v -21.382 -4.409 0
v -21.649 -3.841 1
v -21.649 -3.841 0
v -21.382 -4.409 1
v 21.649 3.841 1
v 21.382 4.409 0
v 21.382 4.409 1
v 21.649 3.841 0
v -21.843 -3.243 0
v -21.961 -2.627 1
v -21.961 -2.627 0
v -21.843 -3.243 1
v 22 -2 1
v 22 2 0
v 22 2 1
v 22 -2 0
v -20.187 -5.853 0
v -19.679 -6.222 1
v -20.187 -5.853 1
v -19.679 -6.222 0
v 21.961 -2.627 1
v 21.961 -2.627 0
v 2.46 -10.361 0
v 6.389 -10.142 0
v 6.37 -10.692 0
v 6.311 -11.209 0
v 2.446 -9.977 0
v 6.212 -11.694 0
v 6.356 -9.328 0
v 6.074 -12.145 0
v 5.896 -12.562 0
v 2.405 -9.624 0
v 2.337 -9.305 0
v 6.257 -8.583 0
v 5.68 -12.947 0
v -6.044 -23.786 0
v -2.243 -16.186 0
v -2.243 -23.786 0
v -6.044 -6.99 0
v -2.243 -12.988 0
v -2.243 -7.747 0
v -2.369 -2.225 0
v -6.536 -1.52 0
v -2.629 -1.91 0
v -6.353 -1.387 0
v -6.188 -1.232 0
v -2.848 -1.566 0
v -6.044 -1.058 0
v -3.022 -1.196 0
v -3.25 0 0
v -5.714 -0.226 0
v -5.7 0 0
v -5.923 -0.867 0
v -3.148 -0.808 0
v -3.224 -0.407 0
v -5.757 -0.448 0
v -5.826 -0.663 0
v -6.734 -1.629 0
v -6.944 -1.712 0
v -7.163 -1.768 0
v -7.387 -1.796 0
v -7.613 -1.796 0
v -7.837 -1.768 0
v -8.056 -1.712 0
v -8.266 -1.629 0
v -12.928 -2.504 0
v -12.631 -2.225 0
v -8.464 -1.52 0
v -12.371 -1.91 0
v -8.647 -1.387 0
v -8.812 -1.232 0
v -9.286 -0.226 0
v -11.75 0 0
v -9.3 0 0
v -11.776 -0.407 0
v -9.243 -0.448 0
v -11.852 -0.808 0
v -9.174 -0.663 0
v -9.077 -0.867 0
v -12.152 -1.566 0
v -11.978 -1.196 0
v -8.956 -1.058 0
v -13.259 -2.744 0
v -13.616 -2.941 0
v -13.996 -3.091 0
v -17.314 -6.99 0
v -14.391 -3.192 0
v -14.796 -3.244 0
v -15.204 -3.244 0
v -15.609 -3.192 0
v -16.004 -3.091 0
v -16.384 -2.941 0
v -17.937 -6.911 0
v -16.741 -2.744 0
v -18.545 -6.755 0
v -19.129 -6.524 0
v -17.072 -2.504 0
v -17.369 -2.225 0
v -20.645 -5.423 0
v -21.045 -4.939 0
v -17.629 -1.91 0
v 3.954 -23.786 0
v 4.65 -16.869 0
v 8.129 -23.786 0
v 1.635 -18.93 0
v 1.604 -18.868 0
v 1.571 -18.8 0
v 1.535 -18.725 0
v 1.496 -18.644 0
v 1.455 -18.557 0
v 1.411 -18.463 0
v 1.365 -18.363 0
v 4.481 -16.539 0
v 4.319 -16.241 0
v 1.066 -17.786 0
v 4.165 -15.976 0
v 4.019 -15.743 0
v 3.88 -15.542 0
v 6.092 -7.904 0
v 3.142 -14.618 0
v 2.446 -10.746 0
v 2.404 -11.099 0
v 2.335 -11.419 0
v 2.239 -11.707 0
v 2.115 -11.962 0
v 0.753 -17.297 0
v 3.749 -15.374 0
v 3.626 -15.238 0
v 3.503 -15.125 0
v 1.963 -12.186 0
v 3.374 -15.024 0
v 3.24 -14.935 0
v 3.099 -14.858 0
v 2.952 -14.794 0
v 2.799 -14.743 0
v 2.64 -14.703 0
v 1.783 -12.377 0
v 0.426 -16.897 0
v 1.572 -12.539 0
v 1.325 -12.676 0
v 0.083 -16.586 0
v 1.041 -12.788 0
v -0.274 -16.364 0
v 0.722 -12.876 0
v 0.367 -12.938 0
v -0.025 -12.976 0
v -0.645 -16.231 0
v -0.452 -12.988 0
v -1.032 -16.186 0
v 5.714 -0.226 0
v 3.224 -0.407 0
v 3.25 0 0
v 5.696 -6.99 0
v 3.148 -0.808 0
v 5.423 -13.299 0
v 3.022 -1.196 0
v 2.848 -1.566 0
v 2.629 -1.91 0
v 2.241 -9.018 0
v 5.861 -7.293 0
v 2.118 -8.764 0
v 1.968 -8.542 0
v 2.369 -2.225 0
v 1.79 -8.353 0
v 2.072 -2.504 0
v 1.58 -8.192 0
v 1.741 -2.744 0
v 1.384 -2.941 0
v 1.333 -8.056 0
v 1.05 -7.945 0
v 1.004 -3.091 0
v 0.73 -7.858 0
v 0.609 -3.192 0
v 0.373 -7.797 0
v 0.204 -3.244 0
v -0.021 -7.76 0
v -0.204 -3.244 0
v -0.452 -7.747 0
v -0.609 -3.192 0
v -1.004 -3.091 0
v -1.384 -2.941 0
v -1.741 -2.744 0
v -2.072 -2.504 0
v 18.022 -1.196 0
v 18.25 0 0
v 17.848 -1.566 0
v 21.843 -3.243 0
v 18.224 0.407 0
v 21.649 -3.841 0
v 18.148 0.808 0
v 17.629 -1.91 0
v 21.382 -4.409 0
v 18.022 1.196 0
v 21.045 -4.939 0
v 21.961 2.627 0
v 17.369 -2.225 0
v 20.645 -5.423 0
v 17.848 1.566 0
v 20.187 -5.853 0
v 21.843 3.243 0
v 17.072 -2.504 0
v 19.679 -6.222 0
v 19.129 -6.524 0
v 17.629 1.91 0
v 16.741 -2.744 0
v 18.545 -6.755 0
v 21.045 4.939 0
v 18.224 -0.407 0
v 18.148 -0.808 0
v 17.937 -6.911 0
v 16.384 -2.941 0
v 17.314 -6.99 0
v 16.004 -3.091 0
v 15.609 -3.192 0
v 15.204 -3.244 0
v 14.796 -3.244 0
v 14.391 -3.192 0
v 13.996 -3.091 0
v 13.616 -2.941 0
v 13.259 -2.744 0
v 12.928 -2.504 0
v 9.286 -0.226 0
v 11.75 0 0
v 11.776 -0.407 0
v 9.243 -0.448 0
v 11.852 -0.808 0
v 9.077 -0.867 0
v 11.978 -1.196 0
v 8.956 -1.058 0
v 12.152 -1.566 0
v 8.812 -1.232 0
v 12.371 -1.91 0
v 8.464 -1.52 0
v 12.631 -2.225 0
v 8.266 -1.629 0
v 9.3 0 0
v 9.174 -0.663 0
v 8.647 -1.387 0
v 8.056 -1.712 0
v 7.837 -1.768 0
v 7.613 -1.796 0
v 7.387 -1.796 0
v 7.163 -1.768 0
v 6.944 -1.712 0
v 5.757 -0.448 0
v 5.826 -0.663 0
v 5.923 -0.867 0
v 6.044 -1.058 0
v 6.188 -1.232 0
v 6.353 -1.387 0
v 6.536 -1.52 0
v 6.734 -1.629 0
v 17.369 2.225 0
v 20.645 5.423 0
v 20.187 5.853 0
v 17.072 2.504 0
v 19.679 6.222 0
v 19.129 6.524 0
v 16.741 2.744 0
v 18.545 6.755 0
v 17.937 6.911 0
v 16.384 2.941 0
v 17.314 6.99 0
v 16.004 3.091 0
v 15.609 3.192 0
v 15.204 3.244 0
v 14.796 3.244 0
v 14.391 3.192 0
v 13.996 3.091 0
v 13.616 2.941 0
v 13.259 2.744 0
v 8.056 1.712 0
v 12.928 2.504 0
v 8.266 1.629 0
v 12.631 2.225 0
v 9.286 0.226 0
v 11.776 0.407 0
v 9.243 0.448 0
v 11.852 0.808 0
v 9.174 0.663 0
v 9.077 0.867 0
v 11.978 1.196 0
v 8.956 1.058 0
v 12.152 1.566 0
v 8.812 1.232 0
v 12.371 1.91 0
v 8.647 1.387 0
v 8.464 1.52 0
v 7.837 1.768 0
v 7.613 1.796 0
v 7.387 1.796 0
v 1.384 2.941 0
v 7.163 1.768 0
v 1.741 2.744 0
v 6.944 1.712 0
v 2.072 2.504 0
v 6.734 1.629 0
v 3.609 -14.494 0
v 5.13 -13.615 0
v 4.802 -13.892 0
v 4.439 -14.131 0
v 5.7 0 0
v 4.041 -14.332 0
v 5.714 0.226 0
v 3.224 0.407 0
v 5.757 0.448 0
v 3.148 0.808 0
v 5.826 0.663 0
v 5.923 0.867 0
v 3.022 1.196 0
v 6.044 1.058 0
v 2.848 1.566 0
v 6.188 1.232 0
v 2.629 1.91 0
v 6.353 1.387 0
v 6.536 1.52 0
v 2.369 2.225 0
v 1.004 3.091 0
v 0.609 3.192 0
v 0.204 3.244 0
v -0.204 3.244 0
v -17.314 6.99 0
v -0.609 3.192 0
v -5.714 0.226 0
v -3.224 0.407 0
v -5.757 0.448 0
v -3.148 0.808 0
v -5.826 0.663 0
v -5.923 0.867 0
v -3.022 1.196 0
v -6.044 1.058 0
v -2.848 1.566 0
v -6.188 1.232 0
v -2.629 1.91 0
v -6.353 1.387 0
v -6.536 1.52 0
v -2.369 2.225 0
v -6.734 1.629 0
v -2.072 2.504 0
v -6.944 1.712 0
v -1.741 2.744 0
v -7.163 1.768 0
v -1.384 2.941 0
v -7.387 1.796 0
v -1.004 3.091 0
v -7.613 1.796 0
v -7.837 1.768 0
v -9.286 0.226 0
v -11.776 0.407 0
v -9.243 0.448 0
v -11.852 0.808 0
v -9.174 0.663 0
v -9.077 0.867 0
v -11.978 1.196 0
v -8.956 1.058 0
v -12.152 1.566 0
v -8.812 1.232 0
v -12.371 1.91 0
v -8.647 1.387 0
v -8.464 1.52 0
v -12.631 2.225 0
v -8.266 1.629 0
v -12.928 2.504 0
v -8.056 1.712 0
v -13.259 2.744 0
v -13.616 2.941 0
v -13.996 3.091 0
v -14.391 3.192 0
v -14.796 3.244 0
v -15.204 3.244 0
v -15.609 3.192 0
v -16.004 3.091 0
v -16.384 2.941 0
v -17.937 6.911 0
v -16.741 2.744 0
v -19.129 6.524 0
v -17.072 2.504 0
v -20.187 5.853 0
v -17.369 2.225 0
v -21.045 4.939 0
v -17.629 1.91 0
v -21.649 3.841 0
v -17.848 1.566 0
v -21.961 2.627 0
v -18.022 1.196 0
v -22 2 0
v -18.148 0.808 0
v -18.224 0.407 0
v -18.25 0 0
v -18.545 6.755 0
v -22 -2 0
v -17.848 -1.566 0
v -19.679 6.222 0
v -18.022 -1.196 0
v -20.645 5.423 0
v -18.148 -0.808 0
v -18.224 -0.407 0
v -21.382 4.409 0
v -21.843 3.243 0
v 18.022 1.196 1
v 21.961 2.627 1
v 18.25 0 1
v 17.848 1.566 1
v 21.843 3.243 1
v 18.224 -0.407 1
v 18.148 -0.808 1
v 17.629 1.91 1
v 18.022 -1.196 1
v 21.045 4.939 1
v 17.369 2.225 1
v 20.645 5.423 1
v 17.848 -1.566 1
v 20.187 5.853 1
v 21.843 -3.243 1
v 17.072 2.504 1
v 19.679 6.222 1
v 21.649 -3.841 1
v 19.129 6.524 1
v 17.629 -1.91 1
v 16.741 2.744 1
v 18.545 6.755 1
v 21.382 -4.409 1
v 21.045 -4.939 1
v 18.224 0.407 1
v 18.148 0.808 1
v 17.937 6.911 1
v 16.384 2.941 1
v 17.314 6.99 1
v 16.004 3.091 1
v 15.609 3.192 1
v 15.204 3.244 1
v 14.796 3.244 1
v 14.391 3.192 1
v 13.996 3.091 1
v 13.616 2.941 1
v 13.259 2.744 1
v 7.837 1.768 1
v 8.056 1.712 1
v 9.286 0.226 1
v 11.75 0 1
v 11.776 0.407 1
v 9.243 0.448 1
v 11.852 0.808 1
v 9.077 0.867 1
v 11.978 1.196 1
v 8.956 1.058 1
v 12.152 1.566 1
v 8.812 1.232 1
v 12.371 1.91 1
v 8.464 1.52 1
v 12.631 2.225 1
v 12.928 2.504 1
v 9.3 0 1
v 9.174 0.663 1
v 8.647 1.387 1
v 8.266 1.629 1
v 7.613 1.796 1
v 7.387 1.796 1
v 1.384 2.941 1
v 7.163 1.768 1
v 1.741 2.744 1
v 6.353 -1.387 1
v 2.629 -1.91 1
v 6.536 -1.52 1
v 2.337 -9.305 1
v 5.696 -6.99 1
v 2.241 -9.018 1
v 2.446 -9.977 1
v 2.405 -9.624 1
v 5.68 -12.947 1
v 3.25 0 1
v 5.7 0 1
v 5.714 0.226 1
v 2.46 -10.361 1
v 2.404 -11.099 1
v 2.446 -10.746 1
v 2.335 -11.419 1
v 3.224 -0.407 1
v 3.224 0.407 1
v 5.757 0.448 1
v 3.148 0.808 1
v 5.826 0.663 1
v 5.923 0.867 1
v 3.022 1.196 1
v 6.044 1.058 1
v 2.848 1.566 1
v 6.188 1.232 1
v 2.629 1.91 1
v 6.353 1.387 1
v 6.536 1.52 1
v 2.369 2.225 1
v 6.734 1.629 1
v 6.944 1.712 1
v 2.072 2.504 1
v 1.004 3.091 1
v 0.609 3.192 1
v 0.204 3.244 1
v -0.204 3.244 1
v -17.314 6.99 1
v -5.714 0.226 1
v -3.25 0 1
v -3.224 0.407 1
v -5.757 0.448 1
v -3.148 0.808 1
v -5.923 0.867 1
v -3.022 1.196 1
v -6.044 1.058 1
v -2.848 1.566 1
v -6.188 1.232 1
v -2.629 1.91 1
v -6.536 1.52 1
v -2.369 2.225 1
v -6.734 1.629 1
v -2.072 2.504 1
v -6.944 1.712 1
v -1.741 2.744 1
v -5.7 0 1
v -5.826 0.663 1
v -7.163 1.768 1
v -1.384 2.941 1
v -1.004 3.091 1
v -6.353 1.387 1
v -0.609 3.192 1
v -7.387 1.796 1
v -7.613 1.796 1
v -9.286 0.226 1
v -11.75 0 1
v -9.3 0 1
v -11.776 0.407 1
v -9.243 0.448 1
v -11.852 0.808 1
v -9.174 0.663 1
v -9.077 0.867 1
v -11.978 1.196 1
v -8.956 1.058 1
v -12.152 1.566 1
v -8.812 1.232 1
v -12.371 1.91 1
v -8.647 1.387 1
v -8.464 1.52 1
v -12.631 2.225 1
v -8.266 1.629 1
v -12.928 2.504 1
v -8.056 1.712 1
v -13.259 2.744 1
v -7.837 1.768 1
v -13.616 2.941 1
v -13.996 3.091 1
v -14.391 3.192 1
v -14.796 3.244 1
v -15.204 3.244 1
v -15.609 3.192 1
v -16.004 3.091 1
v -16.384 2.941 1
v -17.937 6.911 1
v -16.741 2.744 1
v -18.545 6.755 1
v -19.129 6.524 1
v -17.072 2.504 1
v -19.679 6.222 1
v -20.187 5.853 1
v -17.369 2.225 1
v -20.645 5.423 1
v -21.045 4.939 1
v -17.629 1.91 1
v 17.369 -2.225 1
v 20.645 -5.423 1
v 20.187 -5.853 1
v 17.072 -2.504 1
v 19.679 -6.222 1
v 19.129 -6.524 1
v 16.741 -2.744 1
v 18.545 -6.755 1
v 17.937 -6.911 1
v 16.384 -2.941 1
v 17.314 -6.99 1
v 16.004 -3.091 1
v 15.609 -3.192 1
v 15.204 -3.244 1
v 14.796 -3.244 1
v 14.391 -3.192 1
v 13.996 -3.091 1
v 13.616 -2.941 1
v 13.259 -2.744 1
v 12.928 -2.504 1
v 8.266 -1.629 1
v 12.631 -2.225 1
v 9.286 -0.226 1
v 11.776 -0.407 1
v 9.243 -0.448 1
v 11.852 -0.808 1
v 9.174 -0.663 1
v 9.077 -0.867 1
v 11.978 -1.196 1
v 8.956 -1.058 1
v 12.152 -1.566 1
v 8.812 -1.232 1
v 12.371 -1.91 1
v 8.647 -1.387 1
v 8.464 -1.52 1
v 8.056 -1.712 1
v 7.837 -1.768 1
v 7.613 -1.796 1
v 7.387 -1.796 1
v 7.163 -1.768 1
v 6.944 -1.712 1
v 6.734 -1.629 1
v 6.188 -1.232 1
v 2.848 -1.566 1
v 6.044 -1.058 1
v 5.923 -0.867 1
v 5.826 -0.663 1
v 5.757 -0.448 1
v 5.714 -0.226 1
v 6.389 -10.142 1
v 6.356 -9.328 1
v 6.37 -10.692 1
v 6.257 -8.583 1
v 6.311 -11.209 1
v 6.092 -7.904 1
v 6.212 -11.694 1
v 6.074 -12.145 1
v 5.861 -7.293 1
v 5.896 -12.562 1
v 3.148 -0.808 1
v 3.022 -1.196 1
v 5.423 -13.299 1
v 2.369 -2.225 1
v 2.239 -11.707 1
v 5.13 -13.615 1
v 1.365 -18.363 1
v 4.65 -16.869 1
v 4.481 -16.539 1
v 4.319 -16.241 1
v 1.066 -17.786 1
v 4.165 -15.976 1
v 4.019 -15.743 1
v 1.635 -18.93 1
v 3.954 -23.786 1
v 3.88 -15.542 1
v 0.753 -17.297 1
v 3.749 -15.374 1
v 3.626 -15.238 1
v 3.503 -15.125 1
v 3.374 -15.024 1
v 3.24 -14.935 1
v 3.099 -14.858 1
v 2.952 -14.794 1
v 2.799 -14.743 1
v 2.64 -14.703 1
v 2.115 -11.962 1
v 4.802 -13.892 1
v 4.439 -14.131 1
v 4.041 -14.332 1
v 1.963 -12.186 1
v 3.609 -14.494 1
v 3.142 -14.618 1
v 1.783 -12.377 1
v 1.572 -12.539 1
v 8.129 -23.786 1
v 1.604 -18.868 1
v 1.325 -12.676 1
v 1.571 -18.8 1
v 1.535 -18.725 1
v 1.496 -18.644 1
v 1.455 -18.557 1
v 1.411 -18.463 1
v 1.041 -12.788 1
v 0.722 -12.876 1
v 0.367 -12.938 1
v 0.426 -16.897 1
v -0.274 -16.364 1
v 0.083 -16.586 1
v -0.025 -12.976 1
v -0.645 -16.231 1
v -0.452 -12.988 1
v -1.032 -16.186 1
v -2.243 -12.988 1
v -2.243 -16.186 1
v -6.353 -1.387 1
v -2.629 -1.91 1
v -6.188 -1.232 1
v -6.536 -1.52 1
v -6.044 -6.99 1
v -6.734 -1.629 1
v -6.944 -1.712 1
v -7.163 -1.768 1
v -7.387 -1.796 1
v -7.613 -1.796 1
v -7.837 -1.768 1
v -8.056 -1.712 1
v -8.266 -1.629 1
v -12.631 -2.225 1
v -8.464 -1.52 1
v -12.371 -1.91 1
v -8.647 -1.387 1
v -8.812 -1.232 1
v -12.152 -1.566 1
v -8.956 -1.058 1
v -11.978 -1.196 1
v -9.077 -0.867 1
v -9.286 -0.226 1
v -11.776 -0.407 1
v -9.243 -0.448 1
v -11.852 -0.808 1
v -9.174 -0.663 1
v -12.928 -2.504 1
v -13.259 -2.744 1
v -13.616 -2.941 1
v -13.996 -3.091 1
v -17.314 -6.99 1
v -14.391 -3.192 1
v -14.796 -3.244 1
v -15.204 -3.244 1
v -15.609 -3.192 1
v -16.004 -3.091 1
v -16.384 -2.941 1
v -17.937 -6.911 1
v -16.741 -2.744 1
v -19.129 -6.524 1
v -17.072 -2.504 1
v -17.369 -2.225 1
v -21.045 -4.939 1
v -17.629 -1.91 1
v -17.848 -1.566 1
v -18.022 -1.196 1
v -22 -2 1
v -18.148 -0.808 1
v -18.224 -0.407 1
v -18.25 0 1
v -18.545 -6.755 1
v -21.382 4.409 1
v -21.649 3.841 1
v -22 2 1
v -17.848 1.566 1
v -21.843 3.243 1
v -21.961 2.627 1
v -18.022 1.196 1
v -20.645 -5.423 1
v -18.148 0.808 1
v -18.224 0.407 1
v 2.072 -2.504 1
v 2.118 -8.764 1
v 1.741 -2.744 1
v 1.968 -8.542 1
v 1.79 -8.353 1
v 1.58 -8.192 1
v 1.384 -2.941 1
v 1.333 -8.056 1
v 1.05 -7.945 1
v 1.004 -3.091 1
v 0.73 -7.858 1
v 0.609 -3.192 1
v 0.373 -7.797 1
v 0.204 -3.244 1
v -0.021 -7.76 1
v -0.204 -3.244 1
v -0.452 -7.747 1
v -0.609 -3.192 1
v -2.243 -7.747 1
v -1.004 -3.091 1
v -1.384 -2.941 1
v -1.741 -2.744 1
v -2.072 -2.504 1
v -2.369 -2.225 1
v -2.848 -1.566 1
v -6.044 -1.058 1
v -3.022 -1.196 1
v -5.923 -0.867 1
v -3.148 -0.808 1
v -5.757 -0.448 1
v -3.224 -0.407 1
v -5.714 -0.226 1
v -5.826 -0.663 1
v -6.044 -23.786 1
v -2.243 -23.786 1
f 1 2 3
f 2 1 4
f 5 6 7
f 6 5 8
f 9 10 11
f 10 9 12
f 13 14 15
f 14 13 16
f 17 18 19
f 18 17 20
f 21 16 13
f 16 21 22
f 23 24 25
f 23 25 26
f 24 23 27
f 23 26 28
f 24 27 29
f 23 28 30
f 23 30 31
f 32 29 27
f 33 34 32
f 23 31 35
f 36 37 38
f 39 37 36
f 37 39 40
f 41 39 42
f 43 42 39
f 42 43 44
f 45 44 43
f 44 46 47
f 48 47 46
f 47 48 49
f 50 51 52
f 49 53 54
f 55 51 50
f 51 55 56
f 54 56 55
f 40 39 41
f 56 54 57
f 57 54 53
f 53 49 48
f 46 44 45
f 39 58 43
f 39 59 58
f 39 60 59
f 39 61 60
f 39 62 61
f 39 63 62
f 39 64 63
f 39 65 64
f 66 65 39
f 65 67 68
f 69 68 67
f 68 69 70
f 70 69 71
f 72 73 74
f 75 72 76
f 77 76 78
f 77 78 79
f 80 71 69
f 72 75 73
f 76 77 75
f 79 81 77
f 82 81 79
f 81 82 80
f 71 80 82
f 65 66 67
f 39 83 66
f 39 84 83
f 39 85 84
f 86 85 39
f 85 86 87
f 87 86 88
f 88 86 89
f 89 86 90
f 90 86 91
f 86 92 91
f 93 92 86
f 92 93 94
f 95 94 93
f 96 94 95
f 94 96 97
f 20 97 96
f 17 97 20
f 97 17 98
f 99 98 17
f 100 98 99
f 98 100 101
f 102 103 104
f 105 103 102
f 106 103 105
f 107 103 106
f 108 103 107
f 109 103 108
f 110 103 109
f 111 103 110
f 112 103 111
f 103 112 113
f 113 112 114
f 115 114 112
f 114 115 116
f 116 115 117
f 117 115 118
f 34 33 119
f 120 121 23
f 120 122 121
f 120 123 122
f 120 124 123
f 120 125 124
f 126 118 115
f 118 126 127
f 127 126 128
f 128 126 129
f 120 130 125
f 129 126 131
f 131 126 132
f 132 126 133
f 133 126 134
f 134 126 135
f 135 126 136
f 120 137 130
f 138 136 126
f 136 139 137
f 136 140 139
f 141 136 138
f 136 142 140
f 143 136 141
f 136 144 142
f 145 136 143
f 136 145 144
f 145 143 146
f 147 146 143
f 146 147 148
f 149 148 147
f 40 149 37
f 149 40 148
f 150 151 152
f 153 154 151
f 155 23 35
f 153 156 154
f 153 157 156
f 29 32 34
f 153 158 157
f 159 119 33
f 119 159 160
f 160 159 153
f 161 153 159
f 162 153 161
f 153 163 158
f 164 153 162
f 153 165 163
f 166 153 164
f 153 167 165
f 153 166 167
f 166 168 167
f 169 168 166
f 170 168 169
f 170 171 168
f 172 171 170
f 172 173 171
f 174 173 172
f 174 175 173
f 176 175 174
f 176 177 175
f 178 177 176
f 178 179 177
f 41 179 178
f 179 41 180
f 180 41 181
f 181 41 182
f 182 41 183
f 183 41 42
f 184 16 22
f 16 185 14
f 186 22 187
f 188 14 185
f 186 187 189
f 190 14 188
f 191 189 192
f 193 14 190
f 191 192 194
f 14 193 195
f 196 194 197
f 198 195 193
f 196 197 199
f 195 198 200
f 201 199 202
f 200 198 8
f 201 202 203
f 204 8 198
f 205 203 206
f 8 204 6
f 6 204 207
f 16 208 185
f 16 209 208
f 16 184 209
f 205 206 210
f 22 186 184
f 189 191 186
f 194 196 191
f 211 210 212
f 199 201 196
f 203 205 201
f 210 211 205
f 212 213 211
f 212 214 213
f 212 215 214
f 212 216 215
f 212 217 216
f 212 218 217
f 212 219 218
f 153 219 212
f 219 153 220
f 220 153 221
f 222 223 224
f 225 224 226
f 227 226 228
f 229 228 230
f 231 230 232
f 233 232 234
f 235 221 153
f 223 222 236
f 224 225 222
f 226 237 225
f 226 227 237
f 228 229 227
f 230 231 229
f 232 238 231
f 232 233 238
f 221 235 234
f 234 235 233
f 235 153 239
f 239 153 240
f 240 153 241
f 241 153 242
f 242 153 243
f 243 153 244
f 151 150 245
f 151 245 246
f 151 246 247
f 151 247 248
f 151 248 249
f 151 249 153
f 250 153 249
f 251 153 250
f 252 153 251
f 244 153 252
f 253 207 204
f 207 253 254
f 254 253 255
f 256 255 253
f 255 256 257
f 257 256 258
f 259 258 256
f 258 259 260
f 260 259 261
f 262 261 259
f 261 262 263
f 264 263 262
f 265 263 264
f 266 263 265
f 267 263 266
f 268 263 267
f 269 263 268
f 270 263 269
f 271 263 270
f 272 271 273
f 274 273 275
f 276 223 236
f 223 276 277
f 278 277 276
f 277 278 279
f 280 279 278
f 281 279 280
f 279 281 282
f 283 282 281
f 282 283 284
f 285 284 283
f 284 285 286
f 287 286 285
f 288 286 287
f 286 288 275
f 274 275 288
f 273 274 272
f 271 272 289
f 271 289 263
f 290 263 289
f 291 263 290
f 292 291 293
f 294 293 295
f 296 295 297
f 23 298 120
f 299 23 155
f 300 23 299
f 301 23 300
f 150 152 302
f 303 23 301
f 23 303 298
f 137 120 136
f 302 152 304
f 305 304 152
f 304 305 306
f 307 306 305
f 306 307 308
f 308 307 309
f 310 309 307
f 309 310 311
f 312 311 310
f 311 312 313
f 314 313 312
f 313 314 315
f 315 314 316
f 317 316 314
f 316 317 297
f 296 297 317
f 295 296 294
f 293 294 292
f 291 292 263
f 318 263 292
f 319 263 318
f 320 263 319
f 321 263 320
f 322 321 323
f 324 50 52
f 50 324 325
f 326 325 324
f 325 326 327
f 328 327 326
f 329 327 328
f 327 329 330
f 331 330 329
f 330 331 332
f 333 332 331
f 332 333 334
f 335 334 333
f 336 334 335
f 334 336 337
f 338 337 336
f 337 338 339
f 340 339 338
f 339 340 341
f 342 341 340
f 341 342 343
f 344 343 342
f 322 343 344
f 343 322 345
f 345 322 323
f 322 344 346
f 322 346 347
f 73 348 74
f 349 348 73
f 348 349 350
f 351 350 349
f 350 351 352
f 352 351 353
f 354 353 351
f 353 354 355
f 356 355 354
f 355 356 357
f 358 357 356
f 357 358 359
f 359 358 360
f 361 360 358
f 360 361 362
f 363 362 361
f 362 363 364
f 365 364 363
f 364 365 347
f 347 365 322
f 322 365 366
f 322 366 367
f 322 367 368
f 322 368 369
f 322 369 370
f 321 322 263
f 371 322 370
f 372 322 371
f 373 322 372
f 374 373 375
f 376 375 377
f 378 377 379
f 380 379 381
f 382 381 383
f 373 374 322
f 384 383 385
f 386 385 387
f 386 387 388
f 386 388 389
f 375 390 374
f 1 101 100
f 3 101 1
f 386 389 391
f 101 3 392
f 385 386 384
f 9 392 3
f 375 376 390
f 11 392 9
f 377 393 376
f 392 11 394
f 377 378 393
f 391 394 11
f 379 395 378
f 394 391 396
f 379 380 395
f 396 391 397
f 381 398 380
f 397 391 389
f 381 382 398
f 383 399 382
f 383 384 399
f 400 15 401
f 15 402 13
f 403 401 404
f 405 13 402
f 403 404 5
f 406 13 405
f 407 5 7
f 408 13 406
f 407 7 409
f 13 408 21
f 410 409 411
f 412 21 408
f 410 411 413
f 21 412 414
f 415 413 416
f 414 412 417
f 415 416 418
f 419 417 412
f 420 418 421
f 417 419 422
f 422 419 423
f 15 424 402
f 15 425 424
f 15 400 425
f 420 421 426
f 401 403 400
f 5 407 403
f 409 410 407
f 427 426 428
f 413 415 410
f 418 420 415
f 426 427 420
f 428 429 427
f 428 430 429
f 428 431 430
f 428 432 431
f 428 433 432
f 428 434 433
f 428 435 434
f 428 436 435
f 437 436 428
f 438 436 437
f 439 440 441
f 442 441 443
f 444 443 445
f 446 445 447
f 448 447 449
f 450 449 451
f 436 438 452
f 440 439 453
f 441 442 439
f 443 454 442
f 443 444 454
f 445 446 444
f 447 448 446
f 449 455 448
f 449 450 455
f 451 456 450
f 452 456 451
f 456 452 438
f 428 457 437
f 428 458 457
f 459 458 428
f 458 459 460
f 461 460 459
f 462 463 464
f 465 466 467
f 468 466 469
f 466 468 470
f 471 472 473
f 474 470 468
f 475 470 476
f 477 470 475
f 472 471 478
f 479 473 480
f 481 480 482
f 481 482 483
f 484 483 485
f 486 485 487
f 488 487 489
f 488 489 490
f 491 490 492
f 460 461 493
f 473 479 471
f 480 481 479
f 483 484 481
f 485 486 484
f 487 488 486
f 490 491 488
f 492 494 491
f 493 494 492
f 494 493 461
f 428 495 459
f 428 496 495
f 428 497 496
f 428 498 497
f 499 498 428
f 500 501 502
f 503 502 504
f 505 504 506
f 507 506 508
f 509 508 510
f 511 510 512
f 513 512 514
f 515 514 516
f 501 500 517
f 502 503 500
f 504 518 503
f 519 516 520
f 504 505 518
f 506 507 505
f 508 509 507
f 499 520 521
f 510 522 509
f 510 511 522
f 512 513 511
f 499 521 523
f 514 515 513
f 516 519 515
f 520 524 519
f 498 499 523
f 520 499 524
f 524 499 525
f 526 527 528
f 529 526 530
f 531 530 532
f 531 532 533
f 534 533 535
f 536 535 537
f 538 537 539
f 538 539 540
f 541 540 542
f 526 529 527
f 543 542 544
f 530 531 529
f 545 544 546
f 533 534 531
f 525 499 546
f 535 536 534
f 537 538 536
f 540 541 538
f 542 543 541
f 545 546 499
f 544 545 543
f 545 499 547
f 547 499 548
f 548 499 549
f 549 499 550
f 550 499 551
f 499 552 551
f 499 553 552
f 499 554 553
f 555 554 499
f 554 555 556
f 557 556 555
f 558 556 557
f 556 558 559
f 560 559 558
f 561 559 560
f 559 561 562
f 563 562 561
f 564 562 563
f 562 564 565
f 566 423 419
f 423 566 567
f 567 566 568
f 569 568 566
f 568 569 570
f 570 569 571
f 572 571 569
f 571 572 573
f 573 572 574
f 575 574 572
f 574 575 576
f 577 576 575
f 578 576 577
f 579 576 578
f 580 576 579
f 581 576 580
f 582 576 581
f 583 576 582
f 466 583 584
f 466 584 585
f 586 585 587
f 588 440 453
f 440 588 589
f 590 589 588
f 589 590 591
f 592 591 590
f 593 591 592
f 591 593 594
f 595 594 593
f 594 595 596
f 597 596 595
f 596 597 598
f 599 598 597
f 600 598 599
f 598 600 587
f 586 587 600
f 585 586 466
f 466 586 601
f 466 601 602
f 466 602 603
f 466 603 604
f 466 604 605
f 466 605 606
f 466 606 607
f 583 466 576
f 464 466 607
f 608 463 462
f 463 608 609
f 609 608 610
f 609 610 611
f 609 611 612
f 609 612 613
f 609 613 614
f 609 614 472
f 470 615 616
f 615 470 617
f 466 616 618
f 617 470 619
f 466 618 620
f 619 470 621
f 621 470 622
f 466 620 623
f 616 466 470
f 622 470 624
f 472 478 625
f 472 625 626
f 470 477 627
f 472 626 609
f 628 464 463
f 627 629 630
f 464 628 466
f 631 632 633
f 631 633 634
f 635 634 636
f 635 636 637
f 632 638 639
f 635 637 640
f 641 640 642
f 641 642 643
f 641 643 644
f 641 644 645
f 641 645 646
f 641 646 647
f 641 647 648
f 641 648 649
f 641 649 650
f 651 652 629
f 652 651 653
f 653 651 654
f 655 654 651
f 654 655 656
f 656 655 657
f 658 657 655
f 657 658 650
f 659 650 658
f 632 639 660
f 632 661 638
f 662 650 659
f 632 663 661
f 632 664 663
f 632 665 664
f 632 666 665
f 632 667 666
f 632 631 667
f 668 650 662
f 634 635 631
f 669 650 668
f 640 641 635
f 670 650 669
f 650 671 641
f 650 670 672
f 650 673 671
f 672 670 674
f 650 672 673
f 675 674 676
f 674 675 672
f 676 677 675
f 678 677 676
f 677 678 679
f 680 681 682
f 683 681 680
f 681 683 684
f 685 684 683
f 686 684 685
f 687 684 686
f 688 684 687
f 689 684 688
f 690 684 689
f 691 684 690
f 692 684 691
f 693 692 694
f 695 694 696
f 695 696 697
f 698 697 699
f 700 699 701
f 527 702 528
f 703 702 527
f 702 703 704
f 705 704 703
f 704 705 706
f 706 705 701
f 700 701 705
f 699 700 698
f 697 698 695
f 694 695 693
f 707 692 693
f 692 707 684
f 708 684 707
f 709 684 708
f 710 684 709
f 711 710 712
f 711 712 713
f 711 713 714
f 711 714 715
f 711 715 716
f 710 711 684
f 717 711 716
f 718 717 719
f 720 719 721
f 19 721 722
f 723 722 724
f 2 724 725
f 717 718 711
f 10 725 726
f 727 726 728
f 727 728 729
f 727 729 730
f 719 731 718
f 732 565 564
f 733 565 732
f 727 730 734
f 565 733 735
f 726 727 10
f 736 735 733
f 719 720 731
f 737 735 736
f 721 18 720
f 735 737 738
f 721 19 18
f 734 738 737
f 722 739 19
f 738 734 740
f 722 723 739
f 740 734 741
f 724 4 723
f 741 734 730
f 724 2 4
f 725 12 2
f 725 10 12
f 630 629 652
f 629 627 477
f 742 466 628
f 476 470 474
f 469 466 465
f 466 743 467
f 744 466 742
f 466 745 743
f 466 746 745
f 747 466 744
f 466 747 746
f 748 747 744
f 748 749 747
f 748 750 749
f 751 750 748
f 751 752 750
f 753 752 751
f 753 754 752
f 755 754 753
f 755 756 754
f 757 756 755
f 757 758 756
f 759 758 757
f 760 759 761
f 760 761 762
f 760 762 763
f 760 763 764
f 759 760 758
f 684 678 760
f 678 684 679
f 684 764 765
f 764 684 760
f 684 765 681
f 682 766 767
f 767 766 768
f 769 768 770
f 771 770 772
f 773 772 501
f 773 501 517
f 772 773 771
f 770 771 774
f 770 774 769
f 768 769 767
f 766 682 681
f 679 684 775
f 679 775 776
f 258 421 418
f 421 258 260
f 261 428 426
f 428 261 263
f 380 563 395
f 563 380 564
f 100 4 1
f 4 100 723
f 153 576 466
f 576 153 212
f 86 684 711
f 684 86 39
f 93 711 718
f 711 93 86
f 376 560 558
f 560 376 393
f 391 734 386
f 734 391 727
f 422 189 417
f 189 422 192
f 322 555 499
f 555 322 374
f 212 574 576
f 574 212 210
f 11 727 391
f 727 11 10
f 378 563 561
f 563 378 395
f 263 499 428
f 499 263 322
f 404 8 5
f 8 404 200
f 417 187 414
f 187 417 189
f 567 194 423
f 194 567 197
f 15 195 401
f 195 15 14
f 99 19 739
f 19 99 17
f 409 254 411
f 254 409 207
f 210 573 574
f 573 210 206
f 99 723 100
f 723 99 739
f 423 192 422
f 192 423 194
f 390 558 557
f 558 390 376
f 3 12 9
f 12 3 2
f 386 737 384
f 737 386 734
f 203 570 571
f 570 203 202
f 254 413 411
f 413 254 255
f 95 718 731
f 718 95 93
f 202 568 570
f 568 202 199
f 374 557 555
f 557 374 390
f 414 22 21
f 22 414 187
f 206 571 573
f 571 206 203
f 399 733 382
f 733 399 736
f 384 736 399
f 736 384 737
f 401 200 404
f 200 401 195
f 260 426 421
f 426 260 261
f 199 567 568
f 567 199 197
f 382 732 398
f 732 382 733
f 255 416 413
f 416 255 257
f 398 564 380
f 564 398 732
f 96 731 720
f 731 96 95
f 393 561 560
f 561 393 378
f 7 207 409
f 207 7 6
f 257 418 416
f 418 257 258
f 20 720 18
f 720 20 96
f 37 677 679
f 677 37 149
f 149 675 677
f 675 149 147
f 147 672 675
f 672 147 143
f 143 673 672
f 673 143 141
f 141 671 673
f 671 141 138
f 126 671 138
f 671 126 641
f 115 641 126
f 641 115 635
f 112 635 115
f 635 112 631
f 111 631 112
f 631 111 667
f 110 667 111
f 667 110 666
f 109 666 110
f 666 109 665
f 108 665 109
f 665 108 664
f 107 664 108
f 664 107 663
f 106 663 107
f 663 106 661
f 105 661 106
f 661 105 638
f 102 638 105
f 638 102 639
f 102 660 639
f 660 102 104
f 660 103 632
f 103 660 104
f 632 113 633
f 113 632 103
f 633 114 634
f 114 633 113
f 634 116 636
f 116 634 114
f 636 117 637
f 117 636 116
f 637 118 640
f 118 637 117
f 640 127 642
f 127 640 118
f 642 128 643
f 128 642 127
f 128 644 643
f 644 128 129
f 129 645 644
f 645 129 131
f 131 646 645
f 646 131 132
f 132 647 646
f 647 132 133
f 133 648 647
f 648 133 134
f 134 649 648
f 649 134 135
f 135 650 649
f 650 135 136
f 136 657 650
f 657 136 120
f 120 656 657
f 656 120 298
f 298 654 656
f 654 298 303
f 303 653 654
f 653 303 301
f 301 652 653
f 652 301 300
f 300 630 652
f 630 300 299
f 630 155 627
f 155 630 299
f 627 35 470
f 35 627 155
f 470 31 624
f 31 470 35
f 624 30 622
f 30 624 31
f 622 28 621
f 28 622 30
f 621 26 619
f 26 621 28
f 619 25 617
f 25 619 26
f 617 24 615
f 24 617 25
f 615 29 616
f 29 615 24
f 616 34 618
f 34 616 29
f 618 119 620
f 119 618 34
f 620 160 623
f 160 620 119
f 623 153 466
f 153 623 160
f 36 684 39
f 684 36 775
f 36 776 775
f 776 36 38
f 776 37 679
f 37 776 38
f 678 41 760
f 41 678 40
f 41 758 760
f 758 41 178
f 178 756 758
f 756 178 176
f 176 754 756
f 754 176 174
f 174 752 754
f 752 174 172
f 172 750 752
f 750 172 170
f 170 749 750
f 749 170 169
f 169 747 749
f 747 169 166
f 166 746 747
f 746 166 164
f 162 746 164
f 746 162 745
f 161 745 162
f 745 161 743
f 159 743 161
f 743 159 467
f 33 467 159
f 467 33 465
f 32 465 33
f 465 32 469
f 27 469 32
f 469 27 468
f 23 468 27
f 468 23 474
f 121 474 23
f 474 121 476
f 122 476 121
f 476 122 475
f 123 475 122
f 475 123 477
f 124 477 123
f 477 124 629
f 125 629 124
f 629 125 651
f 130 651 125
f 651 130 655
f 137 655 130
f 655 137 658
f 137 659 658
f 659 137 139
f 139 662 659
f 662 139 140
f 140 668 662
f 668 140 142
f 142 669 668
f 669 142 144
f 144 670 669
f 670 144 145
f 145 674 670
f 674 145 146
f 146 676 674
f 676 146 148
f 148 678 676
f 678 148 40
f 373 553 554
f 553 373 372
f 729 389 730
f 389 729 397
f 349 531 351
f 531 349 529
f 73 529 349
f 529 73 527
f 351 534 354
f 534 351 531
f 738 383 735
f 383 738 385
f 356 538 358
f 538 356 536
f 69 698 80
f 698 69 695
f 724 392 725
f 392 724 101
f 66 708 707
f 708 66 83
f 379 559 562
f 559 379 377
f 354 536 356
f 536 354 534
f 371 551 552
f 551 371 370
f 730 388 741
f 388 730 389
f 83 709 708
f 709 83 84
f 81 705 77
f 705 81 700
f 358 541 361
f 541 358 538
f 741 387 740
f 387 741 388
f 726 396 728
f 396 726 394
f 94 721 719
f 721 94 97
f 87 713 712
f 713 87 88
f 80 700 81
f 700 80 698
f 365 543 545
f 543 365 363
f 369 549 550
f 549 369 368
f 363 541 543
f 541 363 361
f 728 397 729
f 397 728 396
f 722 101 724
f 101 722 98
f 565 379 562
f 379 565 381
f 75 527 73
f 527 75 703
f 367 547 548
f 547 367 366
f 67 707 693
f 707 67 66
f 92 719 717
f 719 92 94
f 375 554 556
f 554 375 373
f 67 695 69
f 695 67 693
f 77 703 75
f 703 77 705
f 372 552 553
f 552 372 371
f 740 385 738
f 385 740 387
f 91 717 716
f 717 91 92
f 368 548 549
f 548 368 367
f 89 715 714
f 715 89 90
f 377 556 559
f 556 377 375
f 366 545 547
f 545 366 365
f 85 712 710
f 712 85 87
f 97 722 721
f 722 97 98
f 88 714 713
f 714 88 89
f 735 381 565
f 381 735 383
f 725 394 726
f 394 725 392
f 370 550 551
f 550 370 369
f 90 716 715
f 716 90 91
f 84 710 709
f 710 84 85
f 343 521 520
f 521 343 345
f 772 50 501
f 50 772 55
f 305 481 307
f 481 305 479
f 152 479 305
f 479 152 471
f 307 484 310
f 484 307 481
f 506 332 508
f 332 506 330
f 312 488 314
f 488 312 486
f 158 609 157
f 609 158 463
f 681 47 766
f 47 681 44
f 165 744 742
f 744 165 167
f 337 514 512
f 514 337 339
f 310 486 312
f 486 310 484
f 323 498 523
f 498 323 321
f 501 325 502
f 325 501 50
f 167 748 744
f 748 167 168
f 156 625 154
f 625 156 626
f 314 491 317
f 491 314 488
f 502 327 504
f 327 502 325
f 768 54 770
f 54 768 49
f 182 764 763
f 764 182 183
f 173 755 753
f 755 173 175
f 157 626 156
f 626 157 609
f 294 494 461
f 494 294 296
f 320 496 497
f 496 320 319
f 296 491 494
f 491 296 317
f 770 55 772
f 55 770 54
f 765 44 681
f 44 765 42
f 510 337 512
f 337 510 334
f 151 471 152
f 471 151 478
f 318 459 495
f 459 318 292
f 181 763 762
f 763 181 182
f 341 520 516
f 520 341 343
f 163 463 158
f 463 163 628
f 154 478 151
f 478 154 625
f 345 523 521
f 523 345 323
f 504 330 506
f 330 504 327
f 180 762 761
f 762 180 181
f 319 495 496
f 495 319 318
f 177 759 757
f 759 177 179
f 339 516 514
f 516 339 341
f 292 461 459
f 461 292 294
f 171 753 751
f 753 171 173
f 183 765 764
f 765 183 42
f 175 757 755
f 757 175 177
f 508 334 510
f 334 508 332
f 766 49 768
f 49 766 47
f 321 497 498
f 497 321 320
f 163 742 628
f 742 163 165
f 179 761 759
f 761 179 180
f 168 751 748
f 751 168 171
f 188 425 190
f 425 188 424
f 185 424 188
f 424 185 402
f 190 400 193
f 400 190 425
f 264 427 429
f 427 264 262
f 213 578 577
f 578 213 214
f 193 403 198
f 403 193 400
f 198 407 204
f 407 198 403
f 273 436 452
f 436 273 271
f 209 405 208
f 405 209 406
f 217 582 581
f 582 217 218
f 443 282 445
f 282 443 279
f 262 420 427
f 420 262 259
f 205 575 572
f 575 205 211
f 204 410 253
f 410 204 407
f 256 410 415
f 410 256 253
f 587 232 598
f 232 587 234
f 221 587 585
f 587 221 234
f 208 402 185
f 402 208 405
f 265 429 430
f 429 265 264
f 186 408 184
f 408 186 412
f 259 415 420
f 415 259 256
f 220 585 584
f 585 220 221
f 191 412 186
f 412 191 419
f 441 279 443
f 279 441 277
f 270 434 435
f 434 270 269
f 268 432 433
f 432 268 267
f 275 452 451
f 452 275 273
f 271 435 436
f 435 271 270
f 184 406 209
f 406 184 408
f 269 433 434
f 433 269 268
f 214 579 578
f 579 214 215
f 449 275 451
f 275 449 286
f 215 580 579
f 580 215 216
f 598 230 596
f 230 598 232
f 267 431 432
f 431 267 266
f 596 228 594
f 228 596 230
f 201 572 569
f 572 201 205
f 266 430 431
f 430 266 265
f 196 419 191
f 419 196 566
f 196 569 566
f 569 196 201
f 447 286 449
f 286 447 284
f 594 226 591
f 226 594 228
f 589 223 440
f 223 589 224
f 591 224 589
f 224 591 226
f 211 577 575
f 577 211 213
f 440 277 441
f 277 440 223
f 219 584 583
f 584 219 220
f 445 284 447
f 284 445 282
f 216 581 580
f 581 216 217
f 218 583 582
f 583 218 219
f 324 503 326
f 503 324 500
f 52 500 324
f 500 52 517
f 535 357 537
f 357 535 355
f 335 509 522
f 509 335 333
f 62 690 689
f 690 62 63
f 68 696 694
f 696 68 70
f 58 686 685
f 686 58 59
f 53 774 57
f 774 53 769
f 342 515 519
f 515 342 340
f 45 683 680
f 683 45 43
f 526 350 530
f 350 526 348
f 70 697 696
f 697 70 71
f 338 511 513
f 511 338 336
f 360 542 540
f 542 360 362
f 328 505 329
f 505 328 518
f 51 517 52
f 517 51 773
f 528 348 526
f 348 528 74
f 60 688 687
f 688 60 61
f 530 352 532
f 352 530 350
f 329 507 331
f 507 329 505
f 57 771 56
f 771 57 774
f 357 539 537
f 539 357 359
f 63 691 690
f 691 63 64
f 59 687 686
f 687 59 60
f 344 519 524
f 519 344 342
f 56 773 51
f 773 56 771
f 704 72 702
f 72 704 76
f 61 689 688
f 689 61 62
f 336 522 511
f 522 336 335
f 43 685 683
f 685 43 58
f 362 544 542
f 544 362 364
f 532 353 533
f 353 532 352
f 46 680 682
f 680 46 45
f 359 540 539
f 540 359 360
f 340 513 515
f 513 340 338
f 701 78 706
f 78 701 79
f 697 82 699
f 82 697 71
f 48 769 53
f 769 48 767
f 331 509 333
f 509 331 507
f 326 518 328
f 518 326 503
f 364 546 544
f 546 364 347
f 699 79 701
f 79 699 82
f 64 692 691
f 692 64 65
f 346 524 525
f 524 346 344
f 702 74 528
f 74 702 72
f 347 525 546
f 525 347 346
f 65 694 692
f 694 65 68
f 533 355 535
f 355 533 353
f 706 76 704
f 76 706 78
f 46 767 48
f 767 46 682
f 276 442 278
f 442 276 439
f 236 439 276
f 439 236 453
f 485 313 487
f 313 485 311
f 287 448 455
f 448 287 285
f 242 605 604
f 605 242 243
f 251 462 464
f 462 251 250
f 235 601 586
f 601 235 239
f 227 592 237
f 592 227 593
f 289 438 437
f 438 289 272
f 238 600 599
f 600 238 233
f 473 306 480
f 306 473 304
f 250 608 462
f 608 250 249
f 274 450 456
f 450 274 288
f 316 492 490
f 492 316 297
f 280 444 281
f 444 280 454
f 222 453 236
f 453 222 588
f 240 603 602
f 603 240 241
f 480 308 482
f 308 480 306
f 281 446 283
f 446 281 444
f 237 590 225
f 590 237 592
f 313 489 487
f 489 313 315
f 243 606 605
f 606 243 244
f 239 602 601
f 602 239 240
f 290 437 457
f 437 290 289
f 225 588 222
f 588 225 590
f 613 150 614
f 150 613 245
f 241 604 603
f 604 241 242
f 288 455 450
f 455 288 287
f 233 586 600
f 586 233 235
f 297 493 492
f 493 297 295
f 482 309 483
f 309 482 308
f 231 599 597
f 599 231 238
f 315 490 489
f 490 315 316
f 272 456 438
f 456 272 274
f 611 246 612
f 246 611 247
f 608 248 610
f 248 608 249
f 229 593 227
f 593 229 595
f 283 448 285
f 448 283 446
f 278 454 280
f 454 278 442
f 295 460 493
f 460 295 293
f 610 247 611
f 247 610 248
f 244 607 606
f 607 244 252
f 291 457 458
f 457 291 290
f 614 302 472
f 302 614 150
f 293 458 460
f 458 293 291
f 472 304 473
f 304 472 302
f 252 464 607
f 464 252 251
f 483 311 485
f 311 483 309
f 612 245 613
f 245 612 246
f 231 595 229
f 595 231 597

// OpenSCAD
$fn = 50;


difference() {
	union() {
		*color(alpha = 1.0000000000, c = "gray") {
			translate(v = [0, 14, 0]) {
				linear_extrude(height = 1) {
					text(font = "Arial:style=Bold", halign = "center", size = 4.5000000000, text = "COMMENT description oobb_plate_shape_p_type_1_depth_3_width_1_thickness_r_extra_oobb_size", valign = "center");
				}
			}
		}
		hull() {
			translate(v = [-17.0000000000, 2.0000000000, 0]) {
				cylinder(h = 1, r = 5);
			}
			translate(v = [17.0000000000, 2.0000000000, 0]) {
				cylinder(h = 1, r = 5);
			}
			translate(v = [-17.0000000000, -2.0000000000, 0]) {
				cylinder(h = 1, r = 5);
			}
			translate(v = [17.0000000000, -2.0000000000, 0]) {
				cylinder(h = 1, r = 5);
			}
		}
		translate(v = [0, -5, 0]) {
			linear_extrude(height = 1) {
				text(font = "DejaVu Sans Mono:style=Bold", halign = "center", size = 19.0000000000, text = "R", valign = "top");
			}
		}
	}
	union() {
		*color(alpha = 1.0000000000, c = "gray") {
			translate(v = [0, 14, 0]) {
				linear_extrude(height = 1) {
					text(font = "Arial:style=Bold", halign = "center", size = 4.5000000000, text = "COMMENT description oobb_holes_shape_n_type_3_width_1_thickness_r_extra_oobb_size_1_height_'all'_holes_true_both_holes", valign = "center");
				}
			}
		}
		translate(v = [-15.0000000000, 0.0000000000, 0]) {
			translate(v = [0, 0, -50]) {
				cylinder(h = 100, r = 3.2500000000);
			}
		}
		translate(v = [0, 0, -50]) {
			cylinder(h = 100, r = 3.2500000000);
		}
		translate(v = [15.0000000000, 0.0000000000, 0]) {
			translate(v = [0, 0, -50]) {
				cylinder(h = 100, r = 3.2500000000);
			}
		}
		translate(v = [-15.0000000000, 0.0000000000, 0]) {
			translate(v = [0, 0, -50]) {
				cylinder(h = 100, r = 1.8000000000);
			}
		}
		translate(v = [-7.5000000000, 0.0000000000, 0]) {
			translate(v = [0, 0, -50]) {
				cylinder(h = 100, r = 1.8000000000);
			}
		}
		translate(v = [0, 0, -50]) {
			cylinder(h = 100, r = 1.8000000000);
		}
		translate(v = [7.5000000000, 0.0000000000, 0]) {
			translate(v = [0, 0, -50]) {
				cylinder(h = 100, r = 1.8000000000);
			}
		}
		translate(v = [15.0000000000, 0.0000000000, 0]) {
			translate(v = [0, 0, -50]) {
				cylinder(h = 100, r = 1.8000000000);
			}
		}
	}
}
